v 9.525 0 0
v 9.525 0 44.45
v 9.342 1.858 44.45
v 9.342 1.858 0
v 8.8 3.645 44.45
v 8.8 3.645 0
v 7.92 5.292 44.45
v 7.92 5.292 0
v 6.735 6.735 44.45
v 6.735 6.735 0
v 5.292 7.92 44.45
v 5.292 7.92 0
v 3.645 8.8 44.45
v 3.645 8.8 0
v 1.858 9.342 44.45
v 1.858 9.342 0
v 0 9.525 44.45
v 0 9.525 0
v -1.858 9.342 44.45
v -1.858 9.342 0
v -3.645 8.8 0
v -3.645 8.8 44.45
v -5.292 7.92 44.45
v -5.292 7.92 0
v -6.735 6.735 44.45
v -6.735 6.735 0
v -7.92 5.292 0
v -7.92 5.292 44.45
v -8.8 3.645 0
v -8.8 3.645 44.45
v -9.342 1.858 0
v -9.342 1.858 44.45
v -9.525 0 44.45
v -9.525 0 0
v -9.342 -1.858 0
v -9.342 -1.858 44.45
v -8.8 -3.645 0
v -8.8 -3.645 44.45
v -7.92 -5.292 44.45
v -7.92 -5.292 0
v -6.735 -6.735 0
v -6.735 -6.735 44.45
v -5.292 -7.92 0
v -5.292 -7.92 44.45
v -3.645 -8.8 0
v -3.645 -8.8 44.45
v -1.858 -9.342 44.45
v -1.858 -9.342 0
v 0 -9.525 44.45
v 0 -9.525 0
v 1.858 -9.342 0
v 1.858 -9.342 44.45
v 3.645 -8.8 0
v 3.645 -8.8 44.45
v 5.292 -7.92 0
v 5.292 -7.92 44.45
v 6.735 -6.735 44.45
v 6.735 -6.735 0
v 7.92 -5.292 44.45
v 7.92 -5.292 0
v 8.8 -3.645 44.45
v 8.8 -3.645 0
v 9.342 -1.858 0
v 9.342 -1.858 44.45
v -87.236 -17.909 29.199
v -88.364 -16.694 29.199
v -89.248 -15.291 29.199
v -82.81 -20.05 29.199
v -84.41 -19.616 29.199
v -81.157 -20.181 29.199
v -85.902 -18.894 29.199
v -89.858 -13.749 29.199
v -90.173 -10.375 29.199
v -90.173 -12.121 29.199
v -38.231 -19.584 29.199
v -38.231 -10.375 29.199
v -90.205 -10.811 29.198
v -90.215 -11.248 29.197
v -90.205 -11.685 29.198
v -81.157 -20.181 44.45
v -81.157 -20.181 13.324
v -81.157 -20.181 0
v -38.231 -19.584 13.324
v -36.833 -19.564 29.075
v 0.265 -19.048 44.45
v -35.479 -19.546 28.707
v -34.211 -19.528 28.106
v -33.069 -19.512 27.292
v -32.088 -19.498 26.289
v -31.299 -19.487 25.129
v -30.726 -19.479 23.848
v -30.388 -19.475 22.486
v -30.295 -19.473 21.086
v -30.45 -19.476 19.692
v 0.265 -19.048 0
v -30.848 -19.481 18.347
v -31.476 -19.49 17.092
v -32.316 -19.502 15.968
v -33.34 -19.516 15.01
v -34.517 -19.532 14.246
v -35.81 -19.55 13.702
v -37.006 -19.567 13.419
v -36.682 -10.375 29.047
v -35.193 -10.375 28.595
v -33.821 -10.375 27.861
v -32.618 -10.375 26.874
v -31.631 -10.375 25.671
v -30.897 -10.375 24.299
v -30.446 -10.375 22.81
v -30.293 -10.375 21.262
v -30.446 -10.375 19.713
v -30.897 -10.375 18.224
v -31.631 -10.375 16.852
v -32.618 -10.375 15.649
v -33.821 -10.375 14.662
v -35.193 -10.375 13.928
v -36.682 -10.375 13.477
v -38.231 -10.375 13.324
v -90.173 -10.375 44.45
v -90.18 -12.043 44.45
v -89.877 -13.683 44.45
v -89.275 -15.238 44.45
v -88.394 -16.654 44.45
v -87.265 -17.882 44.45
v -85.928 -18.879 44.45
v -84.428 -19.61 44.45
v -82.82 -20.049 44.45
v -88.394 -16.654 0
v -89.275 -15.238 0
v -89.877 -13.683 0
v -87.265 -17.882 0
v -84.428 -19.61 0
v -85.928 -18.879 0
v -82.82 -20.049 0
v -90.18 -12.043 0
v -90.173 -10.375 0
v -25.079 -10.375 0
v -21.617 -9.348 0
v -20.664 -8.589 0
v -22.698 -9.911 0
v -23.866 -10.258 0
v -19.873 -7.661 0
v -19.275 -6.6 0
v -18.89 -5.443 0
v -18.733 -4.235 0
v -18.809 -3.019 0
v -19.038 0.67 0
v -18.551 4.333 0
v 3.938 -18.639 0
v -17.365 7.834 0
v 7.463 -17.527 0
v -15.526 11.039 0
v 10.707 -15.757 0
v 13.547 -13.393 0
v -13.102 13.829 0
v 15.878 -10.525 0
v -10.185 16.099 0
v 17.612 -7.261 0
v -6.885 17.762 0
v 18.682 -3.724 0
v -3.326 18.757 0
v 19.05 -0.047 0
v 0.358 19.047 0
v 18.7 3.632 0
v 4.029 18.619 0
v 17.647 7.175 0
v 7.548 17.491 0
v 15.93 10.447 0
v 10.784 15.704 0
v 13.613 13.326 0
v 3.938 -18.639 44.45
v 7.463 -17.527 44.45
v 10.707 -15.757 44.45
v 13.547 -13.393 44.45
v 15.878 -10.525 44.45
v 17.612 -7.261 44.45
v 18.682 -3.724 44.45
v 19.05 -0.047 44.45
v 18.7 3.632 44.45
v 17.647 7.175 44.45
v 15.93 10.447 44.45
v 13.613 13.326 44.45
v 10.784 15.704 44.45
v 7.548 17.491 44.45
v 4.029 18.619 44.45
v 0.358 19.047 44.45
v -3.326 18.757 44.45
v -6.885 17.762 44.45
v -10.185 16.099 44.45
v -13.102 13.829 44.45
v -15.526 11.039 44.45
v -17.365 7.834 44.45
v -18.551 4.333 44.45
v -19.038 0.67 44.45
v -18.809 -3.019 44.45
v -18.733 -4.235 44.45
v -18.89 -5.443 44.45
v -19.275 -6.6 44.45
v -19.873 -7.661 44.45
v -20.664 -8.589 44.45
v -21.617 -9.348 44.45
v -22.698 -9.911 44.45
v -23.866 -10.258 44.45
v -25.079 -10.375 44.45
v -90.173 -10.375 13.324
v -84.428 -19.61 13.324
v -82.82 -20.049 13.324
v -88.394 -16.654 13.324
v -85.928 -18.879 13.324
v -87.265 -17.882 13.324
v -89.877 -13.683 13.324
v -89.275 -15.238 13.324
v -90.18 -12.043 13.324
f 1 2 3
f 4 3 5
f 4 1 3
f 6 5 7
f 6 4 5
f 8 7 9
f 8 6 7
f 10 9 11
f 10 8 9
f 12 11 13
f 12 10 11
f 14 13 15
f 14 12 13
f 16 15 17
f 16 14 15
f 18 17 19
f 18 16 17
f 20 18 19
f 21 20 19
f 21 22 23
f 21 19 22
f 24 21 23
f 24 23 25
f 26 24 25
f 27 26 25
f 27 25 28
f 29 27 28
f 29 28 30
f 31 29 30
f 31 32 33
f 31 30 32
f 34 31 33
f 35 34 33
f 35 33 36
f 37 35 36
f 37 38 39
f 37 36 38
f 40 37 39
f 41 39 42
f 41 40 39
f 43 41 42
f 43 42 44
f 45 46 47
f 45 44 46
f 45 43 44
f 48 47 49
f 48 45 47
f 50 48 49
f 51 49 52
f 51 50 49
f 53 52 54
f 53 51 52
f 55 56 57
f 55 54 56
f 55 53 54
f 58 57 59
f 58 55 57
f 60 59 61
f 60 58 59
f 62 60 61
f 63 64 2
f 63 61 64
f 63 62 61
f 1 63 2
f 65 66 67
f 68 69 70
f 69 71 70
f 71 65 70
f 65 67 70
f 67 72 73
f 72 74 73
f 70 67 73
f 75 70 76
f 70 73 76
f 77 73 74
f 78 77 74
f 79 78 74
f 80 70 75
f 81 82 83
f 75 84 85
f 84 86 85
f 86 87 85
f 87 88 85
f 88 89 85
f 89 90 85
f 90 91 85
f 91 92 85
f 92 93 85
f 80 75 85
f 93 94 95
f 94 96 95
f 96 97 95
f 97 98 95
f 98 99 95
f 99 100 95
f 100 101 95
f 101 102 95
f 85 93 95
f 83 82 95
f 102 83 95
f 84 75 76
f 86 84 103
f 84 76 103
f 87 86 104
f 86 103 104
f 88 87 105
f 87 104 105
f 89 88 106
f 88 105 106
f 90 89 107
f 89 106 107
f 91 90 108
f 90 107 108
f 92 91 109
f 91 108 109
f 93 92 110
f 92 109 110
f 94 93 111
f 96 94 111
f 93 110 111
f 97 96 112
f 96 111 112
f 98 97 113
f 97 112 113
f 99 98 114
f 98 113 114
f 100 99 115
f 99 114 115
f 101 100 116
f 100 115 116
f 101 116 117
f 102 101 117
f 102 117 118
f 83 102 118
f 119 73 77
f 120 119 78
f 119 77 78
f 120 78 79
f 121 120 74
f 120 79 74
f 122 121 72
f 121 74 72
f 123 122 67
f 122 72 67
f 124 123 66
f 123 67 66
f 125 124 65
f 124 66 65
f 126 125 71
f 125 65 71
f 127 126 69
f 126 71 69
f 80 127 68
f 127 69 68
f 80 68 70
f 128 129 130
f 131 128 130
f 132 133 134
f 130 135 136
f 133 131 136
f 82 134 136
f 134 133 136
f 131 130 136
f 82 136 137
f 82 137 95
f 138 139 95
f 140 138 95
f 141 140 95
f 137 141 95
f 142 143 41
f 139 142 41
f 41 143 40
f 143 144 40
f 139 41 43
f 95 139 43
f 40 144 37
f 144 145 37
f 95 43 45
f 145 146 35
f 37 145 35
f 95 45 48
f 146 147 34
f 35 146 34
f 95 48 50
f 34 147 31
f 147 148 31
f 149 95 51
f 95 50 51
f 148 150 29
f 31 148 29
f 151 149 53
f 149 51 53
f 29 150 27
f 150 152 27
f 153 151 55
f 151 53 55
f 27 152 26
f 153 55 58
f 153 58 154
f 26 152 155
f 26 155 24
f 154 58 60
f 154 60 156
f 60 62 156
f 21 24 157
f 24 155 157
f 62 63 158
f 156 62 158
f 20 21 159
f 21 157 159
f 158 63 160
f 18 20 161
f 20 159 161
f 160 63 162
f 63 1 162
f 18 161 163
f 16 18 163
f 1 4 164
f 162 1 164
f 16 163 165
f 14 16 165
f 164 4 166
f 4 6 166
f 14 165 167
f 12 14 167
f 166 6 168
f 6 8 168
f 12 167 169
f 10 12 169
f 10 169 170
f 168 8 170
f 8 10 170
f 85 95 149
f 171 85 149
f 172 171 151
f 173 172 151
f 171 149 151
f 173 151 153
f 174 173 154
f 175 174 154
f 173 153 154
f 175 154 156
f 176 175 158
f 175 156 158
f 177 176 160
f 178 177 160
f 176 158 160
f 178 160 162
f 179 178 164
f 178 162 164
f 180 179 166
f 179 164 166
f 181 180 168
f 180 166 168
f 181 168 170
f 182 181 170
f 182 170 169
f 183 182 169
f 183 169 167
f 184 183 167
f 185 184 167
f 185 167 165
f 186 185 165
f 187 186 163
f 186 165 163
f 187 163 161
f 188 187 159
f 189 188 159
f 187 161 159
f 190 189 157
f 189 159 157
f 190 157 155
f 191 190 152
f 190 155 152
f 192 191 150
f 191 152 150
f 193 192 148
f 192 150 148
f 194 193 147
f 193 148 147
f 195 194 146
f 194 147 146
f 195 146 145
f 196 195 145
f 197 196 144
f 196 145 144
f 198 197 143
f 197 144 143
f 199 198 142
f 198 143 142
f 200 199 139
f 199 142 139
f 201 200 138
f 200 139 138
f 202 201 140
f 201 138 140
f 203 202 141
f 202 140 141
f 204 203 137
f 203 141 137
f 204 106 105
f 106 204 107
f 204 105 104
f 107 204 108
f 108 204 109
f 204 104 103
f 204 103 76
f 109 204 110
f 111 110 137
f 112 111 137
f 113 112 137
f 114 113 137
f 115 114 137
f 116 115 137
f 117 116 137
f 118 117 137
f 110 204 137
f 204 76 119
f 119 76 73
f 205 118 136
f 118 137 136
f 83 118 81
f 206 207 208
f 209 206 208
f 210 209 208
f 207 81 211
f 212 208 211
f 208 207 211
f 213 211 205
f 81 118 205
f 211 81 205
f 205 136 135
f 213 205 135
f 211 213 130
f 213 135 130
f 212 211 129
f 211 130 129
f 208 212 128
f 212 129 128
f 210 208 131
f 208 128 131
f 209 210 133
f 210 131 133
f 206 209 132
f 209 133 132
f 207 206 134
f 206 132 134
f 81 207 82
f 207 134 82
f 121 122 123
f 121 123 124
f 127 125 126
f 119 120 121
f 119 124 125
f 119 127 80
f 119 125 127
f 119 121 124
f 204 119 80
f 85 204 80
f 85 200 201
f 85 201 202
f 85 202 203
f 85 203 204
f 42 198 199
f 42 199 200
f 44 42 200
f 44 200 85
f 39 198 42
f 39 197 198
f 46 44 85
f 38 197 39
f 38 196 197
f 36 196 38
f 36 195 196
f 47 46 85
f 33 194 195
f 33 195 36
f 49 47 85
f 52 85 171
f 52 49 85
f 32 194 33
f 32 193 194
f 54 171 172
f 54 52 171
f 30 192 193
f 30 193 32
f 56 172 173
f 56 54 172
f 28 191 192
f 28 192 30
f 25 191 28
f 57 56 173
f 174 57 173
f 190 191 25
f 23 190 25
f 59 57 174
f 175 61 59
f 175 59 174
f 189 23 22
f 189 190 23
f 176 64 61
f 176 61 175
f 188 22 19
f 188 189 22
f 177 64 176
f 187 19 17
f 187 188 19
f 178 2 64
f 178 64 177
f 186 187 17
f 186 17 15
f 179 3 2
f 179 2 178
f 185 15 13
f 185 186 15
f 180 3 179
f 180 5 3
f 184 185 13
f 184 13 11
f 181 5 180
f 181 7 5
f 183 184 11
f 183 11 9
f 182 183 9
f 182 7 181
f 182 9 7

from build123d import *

# Parameters (mm, degrees)
F1_DEPTH = 44.45
F2_R     = 9.525
F3_DEPTH = 50.8
F4_W     = 9.3673091604
F4_H     = 15.875
F5_DEPTH = 50.8


with BuildPart() as f1:
    # F0 (on Top) → F1 (new body)
    with BuildSketch(Plane.XY):
        with BuildLine():
            Line((-81.1569189035, -20.1813574524), (0.265105312, -19.0481552696))
            ThreePointArc((0.265105312, -19.0481552696), (12.2559693491, 14.584022604), (-18.8093233143, -3.0185851749))
            ThreePointArc((-18.8093233143, -3.0185851749), (-20.2463015318, -8.1438311785), (-25.0790977524, -10.3747802332))
            Line((-25.0790977524, -10.3747802332), (-35.6496162713, -10.3747802332))
            Line((-35.6496162713, -10.3747802332), (-78.4760718424, -10.3747802332))
            Line((-78.4760718424, -10.3747802332), (-81.139177084, -10.3747802332))
            Line((-81.139177084, -10.3747802332), (-90.1725590229, -10.3747802332))
            ThreePointArc((-90.1725590229, -10.3747802332), (-87.8582711897, -17.294684498), (-81.1569189035, -20.1813574524))
        make_face()
        with BuildLine():
            ThreePointArc((-81.2756354813, -10.3766794116), (-81.2074128903, -10.3752550508), (-81.139177084, -10.3747802332))
            Line((-81.139177084, -10.3747802332), (-81.2756354813, -10.3766794116))
        make_face(mode=Mode.SUBTRACT)
        with BuildLine():
            Line((-81.2756354813, -10.3766794116), (-81.139177084, -10.3747802332))
            ThreePointArc((-81.139177084, -10.3747802332), (-81.2074128903, -10.3752550508), (-81.2756354813, -10.3766794116))
        make_face()
    extrude(amount=F1_DEPTH)

    # F2 (on Top) → F3 (cut)
    with BuildSketch(Plane.XY):
        Circle(F2_R)
    extrude(amount=F3_DEPTH, mode=Mode.SUBTRACT)

    # F4 (on face) → F5 (cut)
    with BuildSketch(Plane(origin=(0, -10.3747802332, 0), x_dir=(-1, 0, 0), z_dir=(0, 1, 0))):
        with BuildLine():
            Line((38.230586797, 13.324032113), (77.2564191149, 13.324032113))
            Line((77.2564191149, 13.324032113), (77.2564191149, 29.199032113))
            Line((77.2564191149, 29.199032113), (38.230586797, 29.199032113))
            ThreePointArc((38.230586797, 29.199032113), (30.293086797, 21.261532113), (38.230586797, 13.324032113))
        make_face()
        with Locations((81.9400736951, 21.261532113)):
            Rectangle(F4_W, F4_H)
        Polygon((86.6237282753, 29.199032113), (86.6237282753, 13.324032113), (90.1725590229, 13.324032113), (98.23808074, 13.324032113), (98.23808074, 28.8764107972), (90.1725590229, 29.199032113), align=None)
    extrude(amount=-F5_DEPTH, mode=Mode.SUBTRACT)


solid = f1.part
